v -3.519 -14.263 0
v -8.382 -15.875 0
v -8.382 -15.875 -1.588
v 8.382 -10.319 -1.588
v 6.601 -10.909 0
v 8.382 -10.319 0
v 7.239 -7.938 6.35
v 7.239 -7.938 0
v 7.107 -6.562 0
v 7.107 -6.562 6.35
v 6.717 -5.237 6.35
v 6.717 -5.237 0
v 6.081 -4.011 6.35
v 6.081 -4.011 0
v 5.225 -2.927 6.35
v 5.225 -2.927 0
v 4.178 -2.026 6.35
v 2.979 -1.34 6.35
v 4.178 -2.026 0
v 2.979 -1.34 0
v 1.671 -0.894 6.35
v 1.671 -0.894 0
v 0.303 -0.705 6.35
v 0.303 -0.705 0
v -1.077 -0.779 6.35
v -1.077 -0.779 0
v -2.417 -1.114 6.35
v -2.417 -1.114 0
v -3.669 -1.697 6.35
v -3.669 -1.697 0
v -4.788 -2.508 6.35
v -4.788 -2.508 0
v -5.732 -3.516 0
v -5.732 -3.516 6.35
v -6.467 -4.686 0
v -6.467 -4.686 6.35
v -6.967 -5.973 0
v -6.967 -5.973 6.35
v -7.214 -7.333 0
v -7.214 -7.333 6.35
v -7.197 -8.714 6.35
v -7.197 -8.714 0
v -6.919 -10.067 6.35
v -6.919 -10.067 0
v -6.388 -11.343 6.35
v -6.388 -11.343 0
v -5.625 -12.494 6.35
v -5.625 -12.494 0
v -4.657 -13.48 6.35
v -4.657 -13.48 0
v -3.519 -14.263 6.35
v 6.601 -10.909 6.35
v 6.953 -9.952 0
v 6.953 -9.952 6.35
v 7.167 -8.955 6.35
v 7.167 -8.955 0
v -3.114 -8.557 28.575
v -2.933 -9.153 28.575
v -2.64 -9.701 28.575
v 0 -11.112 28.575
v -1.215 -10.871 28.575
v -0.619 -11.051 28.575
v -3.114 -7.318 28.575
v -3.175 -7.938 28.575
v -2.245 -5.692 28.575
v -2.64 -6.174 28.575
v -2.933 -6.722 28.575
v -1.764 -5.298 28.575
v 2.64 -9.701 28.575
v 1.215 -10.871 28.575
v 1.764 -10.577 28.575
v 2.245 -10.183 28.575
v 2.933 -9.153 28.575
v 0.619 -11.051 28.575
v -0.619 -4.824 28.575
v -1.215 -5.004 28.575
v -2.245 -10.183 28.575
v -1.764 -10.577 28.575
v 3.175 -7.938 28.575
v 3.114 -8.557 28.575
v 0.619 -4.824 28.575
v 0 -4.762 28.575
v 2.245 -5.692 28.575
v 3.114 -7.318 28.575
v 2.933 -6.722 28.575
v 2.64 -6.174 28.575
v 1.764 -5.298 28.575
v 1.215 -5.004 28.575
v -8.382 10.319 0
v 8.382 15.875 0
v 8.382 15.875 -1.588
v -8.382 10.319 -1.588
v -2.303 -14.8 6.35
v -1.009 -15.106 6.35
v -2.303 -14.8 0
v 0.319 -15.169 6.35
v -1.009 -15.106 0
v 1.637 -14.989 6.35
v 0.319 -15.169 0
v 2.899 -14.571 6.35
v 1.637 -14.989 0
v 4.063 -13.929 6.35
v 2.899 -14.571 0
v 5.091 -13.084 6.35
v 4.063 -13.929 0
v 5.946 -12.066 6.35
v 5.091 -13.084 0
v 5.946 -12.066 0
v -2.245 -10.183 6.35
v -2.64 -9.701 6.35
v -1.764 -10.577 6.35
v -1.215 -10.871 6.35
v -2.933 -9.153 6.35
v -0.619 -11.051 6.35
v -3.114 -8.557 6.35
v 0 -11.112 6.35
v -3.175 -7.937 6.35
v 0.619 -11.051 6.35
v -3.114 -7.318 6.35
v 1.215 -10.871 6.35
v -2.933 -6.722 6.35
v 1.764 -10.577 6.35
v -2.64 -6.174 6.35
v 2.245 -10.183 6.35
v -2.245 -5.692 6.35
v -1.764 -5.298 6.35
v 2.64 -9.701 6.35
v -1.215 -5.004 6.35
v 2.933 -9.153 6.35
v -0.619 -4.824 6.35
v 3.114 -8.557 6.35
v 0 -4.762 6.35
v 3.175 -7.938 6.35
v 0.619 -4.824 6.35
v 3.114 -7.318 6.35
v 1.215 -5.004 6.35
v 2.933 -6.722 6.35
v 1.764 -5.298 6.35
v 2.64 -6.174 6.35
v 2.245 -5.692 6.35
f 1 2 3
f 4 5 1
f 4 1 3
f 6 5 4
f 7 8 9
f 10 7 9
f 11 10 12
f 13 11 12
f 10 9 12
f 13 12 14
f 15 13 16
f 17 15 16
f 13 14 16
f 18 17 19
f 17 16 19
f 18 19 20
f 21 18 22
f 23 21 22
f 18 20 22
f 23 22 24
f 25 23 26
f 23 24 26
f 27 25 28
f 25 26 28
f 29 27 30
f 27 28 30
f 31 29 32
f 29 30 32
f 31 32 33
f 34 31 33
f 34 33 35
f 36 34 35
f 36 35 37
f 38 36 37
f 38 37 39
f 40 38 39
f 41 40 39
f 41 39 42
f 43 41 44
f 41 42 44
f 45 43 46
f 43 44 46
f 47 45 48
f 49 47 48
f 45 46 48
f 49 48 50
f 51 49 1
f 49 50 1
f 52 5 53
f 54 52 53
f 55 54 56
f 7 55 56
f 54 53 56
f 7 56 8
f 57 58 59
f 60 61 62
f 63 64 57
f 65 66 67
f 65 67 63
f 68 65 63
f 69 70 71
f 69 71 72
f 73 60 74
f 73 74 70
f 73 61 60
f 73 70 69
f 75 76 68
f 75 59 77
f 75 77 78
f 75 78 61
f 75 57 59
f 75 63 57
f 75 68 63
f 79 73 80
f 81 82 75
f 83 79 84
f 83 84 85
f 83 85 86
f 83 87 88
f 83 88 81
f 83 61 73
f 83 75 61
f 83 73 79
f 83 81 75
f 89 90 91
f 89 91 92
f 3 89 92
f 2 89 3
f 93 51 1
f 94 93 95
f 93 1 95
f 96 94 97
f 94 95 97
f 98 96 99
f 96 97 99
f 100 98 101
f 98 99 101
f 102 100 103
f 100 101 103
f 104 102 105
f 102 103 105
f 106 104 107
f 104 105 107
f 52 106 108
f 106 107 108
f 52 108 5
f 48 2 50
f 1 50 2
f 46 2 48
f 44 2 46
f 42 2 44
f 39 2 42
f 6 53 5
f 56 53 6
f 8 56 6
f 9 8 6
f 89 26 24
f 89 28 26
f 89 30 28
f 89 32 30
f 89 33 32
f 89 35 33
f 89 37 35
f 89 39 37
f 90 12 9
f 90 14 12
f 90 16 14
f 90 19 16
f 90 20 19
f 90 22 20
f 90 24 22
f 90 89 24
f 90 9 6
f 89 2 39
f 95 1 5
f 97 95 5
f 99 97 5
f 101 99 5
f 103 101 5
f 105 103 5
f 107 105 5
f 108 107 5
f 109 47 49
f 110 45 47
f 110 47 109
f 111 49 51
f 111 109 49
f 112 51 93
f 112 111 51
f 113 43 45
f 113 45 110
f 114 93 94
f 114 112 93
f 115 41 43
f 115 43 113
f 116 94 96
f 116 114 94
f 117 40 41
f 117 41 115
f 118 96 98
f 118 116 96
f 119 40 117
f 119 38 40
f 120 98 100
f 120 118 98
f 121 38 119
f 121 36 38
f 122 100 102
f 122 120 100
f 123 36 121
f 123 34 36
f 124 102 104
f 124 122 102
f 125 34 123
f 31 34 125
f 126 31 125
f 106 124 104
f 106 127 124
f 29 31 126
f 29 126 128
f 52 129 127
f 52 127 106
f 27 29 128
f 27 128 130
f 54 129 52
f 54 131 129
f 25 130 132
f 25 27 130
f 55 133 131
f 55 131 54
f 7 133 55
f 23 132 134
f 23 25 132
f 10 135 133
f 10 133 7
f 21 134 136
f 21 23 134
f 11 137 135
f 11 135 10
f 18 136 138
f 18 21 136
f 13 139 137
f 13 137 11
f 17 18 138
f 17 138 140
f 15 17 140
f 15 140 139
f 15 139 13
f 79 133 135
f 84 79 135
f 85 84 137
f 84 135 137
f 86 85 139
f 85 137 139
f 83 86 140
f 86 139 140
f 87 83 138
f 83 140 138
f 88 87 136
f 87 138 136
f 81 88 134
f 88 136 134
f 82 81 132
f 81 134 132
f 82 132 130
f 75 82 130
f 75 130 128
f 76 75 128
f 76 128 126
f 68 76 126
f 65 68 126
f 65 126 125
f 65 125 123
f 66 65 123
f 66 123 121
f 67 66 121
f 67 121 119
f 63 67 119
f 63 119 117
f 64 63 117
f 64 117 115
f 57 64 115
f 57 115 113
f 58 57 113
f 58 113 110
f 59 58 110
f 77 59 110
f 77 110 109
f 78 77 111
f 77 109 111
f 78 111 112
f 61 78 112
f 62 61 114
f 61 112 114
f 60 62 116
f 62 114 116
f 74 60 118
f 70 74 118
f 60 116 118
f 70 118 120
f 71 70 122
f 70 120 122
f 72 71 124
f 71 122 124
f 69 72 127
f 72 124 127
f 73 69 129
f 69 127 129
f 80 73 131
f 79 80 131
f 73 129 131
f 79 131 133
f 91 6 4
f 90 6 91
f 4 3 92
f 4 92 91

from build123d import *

# Parameters (mm, degrees)
F1_DEPTH = 1.5875
F3_DEPTH = 6.35
F4_R     = 3.175
F5_DEPTH = 28.575


with BuildPart() as f1:
    # F0 (on Top) → F1 (new body)
    with BuildSketch(Plane.XY):
        Polygon((8.382, -10.31875), (8.382, 15.875), (-8.382, 10.31875), (-8.382, -15.875), align=None)
    extrude(amount=-F1_DEPTH)

    # F2 (on face) → F3 (join)
    with BuildSketch(Plane.XY):
        with BuildLine():
            Line((6.600987, -10.909048), (-3.519459, -14.263362))
            ThreePointArc((-3.519459, -14.263362), (2.277457, -14.808913), (6.600987, -10.909048))
        make_face()
        with BuildLine():
            ThreePointArc((6.600987, -10.909048), (7.0777, -9.457135), (7.239, -7.9375))
            ThreePointArc((7.239, -7.9375), (-3.66918, -1.697288), (-3.519459, -14.263362))
            Line((-3.519459, -14.263362), (6.600987, -10.909048))
        make_face()
    extrude(amount=F3_DEPTH)

    # F4 (on Top) → F5 (join)
    with BuildSketch(Plane.XY):
        with Locations((0, -7.9375)):
            Circle(F4_R)
    extrude(amount=F5_DEPTH)


solid = f1.part
